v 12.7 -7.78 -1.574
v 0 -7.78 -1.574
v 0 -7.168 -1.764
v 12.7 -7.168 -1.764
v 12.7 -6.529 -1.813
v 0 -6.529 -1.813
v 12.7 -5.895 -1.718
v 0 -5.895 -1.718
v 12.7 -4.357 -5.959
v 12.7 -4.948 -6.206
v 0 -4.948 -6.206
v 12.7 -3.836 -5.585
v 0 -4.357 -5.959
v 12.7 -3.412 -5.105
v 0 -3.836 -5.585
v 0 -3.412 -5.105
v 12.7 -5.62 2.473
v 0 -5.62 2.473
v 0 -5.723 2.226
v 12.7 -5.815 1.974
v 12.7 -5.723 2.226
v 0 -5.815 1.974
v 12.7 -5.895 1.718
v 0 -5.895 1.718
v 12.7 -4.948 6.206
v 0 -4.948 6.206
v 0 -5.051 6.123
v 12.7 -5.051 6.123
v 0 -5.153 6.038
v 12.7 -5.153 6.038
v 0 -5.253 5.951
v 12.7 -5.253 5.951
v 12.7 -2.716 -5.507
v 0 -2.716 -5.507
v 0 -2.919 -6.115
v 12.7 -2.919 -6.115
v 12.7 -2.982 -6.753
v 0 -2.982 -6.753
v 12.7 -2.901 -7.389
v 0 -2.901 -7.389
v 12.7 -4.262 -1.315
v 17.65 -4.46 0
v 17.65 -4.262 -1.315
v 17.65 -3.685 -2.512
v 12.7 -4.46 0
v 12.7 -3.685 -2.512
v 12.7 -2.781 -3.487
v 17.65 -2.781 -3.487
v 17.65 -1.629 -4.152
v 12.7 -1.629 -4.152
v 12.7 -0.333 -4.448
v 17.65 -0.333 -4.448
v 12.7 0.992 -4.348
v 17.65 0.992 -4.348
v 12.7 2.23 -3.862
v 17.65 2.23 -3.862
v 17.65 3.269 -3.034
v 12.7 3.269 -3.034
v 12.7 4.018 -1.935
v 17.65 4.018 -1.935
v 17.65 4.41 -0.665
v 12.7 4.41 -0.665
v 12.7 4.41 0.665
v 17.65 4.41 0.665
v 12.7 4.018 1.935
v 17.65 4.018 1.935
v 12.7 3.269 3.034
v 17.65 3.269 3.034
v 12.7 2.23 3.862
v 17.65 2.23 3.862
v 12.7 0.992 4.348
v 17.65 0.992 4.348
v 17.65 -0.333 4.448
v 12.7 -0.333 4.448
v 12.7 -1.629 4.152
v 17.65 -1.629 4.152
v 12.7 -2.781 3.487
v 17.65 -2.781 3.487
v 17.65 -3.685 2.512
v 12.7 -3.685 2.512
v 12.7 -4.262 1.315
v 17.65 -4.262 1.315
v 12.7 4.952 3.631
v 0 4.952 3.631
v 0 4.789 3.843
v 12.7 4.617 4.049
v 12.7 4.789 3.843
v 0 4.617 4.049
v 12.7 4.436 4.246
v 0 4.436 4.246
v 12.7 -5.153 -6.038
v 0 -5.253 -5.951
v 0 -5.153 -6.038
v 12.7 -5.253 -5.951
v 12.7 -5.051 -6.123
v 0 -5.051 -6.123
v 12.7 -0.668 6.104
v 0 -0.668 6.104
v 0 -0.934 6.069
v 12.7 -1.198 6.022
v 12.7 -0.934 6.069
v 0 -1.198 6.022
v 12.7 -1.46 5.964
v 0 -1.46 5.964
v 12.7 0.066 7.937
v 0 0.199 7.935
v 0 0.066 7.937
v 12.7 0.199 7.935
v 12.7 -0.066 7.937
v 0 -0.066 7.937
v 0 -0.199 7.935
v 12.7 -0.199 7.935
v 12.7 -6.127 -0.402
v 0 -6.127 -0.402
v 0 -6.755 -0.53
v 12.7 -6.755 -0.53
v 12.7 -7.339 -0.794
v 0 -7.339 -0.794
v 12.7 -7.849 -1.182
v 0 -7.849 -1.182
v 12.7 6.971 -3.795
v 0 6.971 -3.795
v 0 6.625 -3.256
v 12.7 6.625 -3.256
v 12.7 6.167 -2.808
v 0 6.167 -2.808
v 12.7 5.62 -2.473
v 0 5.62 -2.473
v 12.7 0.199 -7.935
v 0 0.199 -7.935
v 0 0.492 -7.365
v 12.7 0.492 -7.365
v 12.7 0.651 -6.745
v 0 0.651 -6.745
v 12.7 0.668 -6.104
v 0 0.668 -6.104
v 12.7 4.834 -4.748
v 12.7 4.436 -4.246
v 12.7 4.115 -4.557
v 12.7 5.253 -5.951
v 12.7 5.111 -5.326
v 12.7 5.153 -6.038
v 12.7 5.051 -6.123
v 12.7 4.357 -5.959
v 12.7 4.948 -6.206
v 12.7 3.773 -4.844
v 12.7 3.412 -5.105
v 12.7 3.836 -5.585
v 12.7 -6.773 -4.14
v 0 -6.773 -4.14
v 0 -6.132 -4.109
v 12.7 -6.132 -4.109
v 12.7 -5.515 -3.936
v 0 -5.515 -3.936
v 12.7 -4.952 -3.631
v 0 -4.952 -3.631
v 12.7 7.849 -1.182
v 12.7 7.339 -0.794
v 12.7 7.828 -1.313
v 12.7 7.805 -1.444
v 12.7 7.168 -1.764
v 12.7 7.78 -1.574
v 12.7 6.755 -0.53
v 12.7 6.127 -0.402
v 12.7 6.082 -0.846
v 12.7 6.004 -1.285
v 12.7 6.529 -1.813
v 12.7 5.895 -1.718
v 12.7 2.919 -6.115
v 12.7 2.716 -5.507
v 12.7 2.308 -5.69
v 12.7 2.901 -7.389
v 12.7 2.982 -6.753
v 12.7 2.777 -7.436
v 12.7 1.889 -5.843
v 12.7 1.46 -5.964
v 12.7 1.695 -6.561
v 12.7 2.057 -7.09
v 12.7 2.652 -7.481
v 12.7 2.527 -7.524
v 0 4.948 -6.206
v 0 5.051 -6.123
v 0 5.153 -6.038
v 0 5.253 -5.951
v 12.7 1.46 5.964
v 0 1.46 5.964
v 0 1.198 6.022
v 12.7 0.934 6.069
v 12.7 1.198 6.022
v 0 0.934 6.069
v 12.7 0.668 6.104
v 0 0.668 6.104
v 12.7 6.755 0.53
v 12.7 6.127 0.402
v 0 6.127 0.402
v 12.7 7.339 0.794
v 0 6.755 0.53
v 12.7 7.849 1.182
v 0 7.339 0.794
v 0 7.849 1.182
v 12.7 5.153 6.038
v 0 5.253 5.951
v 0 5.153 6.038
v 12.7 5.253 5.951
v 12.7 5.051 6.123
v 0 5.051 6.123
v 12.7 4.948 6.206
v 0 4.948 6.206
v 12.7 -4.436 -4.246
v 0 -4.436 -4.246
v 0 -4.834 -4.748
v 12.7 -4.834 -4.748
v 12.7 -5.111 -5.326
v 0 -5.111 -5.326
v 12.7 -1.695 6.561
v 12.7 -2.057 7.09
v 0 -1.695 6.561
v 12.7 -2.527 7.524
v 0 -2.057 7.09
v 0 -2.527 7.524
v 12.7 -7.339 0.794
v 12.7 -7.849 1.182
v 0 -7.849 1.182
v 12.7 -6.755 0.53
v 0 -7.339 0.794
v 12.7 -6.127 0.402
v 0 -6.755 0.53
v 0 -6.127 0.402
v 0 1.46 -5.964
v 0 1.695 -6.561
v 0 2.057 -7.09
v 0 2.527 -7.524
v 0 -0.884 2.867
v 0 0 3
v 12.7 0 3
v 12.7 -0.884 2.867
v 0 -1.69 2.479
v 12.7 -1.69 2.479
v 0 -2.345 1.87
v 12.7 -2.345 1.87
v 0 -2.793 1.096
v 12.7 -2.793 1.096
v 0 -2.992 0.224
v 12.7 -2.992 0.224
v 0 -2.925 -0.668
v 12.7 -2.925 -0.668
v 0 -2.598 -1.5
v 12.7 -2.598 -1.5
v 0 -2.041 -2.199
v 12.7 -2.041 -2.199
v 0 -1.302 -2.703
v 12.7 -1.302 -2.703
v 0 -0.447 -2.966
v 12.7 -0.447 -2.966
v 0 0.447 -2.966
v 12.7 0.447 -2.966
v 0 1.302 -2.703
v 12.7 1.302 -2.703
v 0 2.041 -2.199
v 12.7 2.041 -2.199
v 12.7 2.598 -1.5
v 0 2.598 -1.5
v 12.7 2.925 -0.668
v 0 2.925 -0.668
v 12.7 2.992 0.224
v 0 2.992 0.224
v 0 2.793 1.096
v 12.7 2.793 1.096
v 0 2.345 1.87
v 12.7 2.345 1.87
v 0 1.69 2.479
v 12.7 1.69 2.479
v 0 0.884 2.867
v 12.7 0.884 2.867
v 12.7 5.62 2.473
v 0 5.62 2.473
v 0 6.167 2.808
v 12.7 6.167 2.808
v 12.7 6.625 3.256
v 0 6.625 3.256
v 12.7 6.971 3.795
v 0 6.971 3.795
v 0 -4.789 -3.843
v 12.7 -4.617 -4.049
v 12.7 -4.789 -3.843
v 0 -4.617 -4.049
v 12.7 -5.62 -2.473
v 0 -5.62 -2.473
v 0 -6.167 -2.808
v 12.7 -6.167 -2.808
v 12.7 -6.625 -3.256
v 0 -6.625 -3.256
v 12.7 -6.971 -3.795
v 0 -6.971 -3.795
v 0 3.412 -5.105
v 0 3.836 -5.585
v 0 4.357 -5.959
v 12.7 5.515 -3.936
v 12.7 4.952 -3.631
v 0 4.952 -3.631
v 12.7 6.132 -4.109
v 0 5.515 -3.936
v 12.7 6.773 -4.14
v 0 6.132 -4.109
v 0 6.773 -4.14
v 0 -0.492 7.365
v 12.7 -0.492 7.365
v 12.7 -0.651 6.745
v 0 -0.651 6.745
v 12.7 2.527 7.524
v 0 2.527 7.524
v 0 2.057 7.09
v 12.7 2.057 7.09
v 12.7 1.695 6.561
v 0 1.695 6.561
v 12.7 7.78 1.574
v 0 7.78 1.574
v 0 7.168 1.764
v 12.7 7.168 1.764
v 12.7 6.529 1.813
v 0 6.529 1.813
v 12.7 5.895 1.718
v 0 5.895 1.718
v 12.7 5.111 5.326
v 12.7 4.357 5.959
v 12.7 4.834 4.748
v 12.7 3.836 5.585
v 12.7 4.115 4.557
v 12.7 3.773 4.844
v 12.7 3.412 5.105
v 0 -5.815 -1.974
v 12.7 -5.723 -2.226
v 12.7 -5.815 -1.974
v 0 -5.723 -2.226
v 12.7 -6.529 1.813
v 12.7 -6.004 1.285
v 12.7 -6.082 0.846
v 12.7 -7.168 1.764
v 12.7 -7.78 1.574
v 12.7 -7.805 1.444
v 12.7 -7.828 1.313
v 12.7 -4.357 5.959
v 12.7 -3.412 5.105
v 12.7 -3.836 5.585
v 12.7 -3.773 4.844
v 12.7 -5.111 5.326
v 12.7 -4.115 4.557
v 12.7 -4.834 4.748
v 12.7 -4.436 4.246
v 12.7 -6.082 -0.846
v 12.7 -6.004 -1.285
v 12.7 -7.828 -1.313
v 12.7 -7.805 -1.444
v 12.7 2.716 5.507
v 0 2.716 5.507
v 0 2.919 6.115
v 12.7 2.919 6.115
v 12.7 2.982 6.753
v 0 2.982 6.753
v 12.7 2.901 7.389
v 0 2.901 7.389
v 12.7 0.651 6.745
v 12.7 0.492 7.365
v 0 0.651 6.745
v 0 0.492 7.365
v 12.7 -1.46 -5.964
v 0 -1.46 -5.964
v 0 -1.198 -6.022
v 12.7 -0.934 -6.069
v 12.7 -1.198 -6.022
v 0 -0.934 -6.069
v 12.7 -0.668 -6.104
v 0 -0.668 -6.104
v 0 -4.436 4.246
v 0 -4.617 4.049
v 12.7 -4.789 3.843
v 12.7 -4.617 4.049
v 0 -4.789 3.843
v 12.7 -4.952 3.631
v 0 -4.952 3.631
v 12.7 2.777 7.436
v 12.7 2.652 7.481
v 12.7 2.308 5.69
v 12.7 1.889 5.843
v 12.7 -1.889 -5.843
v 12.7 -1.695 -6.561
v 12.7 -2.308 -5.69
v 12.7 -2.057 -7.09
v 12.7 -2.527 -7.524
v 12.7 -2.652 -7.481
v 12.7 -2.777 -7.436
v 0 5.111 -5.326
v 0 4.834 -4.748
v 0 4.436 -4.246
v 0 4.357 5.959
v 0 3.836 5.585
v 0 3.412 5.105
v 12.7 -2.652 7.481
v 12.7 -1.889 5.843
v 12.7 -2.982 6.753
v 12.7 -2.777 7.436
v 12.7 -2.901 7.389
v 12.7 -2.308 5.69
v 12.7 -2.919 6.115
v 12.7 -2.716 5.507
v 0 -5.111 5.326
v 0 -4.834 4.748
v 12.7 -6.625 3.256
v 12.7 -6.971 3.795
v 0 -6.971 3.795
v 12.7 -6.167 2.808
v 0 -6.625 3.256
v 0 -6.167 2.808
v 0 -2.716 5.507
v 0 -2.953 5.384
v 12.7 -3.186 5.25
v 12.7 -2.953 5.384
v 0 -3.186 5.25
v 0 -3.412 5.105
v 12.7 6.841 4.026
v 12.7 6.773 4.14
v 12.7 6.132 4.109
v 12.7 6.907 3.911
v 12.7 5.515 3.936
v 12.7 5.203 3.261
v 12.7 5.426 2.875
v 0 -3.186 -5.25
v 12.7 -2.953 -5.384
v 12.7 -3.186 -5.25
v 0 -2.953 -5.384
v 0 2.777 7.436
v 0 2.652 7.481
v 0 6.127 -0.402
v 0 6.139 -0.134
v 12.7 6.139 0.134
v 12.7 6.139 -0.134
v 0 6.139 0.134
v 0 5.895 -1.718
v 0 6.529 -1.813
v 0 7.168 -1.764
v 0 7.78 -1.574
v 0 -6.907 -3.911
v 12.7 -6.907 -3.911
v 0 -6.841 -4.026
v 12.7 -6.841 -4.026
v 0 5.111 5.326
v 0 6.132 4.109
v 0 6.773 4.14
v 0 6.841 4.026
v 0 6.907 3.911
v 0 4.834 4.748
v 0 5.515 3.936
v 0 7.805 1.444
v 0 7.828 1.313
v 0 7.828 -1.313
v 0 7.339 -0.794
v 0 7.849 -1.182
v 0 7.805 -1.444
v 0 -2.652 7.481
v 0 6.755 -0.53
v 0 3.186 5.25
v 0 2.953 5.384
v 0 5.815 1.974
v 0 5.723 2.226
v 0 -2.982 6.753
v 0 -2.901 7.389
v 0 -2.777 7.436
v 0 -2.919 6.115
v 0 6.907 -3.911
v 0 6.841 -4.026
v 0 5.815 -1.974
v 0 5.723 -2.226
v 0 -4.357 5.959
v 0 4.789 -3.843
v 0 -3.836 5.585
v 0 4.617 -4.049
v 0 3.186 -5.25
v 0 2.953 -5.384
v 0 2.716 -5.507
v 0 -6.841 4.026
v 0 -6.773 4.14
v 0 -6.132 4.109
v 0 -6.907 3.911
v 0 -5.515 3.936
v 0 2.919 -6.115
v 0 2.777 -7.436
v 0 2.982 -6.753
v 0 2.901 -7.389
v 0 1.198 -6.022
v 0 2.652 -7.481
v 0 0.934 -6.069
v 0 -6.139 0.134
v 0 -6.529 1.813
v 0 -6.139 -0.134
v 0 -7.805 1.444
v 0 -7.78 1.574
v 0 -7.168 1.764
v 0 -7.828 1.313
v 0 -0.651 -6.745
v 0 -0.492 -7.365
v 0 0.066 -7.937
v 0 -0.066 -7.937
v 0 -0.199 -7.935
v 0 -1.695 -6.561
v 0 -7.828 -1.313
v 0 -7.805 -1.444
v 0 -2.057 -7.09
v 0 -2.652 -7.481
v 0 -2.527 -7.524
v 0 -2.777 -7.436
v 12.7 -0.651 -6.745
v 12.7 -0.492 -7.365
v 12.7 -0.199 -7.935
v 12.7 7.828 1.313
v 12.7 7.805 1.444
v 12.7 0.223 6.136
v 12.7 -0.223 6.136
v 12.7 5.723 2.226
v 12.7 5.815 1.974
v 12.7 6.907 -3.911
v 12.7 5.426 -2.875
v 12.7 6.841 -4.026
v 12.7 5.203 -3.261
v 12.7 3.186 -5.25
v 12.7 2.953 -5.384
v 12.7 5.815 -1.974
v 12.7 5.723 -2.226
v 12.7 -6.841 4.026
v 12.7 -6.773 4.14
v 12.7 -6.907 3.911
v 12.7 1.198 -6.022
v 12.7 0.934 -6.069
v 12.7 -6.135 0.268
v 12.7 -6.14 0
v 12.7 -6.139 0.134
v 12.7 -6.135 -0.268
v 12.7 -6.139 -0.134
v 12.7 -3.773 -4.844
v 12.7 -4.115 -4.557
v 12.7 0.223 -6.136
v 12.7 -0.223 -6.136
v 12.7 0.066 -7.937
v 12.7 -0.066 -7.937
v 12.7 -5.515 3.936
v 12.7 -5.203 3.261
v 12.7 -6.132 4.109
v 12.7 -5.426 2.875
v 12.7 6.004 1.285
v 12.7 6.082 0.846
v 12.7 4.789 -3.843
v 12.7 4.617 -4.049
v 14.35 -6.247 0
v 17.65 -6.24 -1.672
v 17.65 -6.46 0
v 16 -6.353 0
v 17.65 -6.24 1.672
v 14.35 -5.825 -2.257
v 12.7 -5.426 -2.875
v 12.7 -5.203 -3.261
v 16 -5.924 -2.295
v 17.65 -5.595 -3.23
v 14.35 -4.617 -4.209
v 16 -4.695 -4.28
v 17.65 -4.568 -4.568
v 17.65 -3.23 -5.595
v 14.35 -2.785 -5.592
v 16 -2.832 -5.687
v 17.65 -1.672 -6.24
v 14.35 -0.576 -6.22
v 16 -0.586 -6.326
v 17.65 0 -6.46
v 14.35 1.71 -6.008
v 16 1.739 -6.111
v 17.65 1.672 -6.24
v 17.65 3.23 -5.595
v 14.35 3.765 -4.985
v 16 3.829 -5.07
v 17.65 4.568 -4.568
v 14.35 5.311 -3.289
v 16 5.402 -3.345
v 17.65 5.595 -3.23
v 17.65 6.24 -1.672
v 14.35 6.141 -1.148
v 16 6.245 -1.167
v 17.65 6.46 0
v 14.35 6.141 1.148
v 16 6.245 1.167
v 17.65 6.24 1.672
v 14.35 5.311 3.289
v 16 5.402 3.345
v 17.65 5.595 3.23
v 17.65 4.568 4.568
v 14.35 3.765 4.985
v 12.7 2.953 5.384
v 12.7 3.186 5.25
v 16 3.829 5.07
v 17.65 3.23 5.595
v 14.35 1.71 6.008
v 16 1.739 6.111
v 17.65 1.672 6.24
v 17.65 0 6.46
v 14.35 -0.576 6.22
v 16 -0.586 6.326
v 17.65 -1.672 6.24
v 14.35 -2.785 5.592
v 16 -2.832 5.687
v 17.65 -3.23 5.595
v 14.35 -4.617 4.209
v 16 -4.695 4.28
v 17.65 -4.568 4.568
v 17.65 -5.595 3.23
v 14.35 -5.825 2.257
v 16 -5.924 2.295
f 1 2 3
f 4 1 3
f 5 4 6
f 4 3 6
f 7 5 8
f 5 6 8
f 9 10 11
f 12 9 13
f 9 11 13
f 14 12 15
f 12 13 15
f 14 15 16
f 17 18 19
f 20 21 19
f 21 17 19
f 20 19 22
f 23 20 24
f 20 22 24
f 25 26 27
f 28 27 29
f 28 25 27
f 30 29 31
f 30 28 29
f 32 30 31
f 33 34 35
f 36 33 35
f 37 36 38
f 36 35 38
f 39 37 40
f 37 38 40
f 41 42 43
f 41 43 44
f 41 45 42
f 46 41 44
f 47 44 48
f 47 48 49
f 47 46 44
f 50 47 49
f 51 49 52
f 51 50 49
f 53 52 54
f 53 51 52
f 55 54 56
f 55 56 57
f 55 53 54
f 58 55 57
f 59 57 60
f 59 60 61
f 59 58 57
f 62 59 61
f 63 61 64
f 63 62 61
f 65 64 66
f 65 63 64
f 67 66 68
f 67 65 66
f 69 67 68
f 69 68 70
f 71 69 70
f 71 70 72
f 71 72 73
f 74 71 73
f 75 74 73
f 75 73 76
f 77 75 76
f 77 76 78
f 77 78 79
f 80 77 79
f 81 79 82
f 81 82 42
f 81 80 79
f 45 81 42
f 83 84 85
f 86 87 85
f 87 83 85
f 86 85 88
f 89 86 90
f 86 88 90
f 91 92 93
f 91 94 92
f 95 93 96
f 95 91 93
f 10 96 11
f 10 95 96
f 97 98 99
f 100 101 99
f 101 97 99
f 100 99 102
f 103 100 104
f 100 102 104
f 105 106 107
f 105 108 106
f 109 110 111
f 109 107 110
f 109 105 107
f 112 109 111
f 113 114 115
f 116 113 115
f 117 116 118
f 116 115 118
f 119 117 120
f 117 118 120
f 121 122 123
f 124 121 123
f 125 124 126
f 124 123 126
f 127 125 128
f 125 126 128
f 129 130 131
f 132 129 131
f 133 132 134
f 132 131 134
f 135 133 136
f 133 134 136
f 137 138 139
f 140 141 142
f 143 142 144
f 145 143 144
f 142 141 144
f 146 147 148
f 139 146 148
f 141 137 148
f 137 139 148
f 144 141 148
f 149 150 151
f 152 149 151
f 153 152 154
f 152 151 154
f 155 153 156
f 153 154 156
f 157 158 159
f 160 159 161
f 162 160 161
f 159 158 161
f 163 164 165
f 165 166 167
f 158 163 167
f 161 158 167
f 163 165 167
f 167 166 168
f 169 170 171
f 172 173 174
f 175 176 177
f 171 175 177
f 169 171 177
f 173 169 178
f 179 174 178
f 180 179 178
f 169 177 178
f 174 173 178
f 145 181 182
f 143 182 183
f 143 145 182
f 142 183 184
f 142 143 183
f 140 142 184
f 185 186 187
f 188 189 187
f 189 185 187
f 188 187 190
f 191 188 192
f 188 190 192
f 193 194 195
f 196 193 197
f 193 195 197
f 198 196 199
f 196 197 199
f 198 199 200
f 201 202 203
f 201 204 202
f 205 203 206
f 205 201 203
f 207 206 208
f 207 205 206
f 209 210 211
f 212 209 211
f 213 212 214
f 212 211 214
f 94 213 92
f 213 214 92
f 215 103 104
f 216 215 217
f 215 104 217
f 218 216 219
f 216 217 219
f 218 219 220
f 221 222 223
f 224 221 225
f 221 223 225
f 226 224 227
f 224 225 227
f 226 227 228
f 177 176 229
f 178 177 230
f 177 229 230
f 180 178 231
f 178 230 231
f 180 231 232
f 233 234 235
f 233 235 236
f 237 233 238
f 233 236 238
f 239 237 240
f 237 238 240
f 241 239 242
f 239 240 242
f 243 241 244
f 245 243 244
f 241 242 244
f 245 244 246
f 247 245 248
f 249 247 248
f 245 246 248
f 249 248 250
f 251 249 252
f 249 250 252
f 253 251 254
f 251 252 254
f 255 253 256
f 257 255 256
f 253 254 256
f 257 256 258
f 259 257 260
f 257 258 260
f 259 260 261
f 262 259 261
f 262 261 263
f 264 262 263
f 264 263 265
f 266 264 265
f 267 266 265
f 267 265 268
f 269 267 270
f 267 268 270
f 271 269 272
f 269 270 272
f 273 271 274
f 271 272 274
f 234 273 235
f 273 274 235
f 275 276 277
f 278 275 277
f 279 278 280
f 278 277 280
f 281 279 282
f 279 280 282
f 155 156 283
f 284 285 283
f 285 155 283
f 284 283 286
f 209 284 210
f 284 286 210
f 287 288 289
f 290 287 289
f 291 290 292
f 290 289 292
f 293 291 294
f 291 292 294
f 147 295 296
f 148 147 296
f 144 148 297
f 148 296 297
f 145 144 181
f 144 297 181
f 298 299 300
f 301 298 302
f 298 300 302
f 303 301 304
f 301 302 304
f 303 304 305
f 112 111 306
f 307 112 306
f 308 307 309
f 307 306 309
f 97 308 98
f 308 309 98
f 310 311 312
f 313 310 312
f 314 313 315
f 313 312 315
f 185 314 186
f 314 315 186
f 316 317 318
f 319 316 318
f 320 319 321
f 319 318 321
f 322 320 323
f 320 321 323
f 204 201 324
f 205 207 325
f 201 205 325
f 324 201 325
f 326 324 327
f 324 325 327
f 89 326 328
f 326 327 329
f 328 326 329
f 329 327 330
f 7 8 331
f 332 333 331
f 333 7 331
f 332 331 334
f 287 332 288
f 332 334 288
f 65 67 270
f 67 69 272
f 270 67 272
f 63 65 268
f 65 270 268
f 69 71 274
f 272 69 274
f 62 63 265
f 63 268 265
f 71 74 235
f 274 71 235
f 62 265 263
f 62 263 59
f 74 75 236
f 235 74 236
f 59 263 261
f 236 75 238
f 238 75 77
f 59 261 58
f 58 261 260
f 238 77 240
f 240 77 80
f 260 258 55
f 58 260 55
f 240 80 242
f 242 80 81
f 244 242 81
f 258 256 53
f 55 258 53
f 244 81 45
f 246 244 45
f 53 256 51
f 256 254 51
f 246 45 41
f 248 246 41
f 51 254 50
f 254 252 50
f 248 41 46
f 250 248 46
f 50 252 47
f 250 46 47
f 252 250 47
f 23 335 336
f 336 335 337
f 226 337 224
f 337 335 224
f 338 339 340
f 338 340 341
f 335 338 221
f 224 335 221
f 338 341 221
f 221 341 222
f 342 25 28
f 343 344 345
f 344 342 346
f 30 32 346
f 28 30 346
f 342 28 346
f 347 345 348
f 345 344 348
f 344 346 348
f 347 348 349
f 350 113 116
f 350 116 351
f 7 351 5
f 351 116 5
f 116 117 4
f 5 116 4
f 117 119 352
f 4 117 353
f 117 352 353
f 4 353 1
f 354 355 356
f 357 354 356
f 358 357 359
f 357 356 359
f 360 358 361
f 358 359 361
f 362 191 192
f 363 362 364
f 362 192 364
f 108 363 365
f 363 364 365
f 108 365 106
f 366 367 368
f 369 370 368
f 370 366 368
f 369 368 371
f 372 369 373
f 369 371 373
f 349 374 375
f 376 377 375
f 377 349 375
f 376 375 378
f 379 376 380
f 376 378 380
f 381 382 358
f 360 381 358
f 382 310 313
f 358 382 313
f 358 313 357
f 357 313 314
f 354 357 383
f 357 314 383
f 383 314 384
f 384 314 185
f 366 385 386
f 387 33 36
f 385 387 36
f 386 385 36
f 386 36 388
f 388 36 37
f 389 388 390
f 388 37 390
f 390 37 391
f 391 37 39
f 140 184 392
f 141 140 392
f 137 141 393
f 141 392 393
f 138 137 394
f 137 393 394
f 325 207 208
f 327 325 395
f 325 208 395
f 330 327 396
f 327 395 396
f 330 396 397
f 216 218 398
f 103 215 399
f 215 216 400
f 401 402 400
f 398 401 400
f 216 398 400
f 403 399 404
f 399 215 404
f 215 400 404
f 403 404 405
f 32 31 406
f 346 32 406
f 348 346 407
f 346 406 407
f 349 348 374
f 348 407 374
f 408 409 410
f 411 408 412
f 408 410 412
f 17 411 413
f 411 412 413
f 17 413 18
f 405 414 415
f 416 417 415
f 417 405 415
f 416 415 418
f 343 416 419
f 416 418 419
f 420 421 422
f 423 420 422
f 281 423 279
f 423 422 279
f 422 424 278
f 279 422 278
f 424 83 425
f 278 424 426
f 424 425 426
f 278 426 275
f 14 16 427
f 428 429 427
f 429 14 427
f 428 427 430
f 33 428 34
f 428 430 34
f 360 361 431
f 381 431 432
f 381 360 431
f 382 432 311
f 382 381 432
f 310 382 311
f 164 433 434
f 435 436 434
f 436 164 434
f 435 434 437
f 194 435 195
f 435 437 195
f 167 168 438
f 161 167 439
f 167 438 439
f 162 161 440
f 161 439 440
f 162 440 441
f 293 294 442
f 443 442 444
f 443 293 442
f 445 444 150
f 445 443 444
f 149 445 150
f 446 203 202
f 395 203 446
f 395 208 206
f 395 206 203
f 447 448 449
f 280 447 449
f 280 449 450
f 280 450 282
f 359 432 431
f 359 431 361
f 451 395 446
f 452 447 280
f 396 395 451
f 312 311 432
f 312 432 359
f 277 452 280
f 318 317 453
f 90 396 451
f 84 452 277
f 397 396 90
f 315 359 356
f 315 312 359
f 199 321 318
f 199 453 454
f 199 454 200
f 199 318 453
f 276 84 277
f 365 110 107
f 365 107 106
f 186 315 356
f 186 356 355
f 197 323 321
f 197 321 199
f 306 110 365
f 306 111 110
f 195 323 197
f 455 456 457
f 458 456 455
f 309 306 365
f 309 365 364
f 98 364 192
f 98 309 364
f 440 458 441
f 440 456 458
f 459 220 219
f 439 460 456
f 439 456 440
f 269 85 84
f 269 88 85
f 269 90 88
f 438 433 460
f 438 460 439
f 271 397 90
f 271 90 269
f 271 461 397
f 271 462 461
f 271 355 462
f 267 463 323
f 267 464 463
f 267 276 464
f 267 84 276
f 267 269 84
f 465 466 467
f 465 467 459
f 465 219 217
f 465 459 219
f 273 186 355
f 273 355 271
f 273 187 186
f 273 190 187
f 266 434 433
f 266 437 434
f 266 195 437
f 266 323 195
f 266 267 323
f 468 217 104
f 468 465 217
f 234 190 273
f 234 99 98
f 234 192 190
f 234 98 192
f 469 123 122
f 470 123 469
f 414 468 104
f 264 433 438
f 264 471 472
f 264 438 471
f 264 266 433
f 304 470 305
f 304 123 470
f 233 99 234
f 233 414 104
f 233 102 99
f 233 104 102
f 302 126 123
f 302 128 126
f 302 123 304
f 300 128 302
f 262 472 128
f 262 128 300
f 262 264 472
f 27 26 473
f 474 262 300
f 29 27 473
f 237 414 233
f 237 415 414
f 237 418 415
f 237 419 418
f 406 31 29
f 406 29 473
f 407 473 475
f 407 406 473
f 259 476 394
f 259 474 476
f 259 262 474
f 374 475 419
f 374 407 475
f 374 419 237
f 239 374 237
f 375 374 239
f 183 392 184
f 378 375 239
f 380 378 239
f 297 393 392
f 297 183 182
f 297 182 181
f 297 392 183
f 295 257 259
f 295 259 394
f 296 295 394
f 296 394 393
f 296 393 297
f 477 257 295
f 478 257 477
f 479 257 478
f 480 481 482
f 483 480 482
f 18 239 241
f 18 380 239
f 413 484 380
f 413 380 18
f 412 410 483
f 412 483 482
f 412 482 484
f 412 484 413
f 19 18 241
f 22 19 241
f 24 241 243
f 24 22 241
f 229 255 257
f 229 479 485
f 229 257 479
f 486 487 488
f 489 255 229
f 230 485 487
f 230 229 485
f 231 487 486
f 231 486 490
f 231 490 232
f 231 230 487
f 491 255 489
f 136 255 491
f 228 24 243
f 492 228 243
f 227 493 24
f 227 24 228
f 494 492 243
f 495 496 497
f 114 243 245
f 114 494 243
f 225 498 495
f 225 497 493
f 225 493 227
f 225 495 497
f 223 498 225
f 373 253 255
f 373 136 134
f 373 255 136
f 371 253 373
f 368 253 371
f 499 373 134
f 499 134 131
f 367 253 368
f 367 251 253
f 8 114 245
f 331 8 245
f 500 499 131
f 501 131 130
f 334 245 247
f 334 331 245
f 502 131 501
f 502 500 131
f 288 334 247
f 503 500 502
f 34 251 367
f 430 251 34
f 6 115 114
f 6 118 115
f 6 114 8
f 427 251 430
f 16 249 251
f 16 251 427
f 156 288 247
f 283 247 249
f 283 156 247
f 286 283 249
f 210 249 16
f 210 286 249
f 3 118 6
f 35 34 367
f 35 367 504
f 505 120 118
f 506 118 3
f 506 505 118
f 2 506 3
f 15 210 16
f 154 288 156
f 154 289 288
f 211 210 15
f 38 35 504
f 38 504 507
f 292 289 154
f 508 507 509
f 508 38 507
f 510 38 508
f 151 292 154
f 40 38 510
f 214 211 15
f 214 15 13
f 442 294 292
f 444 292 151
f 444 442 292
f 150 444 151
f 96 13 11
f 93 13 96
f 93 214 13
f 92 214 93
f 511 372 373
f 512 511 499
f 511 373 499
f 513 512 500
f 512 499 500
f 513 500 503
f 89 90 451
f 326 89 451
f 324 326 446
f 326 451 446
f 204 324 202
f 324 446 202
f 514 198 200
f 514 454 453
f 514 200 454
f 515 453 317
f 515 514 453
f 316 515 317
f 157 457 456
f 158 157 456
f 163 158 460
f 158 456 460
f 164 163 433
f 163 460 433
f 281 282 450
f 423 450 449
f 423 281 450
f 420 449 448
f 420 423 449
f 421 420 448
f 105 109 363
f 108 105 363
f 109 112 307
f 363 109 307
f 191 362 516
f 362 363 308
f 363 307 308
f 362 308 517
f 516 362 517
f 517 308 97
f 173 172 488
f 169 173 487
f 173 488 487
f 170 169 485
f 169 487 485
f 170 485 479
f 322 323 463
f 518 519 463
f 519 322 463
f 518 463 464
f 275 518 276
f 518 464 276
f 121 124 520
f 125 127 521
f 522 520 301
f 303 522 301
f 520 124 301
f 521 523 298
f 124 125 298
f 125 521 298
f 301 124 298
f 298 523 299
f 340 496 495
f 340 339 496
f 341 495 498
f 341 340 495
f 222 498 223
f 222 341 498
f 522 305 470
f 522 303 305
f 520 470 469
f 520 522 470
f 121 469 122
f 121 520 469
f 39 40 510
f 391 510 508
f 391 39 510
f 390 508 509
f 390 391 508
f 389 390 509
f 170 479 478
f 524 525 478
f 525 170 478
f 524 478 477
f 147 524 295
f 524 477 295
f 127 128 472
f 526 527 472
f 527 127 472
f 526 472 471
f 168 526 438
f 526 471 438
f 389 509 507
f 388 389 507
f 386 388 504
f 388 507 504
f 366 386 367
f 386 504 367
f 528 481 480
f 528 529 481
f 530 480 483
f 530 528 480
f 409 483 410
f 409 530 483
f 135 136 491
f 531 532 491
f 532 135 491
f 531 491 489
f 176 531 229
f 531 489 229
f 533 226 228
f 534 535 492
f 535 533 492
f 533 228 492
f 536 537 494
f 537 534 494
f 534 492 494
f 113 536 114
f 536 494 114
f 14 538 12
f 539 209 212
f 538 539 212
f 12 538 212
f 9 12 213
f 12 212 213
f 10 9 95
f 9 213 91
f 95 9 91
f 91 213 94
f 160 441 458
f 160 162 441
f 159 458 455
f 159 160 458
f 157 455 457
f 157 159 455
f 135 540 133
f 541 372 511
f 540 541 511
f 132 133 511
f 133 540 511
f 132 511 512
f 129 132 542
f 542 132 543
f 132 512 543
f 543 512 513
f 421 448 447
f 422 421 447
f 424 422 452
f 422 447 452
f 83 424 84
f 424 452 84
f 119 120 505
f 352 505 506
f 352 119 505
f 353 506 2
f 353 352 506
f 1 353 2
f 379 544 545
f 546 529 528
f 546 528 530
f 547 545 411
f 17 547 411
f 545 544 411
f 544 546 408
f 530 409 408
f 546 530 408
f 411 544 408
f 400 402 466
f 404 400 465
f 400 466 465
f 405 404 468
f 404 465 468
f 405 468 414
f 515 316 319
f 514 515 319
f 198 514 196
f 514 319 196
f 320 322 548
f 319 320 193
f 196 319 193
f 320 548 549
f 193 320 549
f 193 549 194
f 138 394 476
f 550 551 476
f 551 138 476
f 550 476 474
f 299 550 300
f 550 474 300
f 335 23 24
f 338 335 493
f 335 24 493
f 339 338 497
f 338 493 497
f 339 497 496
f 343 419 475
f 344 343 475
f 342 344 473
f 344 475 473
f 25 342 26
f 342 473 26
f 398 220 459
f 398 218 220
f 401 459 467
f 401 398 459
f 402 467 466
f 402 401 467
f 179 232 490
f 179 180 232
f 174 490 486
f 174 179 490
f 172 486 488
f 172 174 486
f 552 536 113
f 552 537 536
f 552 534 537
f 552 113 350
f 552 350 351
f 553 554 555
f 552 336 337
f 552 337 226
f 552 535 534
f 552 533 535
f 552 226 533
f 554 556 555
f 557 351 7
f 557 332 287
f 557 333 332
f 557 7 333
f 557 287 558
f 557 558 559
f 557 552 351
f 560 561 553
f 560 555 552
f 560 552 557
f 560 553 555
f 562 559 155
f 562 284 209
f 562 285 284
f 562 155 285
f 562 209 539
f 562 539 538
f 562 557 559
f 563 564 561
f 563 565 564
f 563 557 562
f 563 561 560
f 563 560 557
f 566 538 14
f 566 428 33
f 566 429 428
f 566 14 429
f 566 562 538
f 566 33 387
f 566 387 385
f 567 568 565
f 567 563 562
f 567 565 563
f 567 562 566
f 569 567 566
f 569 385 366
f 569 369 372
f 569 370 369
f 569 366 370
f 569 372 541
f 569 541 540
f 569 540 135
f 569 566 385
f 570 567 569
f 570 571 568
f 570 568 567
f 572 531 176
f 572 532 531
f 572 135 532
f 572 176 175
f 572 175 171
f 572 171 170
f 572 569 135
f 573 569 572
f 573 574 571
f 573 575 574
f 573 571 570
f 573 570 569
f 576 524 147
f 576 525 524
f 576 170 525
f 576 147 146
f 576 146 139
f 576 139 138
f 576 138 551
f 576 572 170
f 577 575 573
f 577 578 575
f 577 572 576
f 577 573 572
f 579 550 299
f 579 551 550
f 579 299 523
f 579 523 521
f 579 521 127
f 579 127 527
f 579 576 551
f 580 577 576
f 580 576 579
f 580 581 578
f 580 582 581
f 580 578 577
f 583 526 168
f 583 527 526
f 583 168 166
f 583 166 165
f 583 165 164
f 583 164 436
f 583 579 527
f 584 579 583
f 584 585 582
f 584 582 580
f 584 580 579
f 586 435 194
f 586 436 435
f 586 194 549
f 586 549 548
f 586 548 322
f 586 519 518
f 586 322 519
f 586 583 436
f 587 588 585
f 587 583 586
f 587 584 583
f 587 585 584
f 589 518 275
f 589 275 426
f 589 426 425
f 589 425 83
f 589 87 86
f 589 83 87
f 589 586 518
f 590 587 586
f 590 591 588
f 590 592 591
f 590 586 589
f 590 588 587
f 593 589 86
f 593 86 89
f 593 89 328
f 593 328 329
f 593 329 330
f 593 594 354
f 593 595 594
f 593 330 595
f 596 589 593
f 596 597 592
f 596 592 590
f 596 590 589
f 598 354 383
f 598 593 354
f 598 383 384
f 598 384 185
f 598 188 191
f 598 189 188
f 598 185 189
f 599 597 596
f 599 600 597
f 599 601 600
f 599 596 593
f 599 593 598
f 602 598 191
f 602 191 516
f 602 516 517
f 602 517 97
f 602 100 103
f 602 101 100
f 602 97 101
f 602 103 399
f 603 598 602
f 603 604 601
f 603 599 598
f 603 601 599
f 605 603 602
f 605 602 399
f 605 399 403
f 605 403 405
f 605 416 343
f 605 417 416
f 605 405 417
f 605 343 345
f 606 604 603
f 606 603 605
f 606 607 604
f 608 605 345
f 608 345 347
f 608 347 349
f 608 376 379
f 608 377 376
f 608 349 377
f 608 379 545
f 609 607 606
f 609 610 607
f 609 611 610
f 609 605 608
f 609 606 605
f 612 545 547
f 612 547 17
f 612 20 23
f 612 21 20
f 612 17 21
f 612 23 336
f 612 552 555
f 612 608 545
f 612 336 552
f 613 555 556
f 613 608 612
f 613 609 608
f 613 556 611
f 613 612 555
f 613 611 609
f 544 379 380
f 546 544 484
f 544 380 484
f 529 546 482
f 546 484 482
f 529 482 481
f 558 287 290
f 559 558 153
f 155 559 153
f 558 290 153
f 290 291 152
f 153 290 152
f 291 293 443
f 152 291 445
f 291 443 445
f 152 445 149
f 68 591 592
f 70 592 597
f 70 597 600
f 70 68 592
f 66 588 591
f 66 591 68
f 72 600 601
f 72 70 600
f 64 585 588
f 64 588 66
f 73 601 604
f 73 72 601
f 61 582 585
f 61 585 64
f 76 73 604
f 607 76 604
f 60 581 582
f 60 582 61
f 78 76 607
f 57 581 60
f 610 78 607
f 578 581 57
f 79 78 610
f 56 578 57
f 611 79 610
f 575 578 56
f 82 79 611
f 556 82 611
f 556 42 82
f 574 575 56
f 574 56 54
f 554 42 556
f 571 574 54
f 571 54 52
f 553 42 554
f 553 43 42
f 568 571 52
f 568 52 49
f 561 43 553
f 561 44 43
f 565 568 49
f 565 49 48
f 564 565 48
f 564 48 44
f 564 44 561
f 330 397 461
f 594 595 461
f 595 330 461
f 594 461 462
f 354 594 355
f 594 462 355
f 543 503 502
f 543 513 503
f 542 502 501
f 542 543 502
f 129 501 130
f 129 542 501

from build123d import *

# Parameters (mm, degrees)
BASPROSKE_W     = 12.7
BASPROSKE_H     = 7.9375
TOOTHCUT_DEPTH  = 17.949861725
TEETHCUTS_COUNT = 18
TEETHCUTS_ANGLE = 340
BORSKE_R        = 3
BORE_DEPTH      = 50.8000508


with BuildPart() as part:
    # BasProSke → Base-Revolve (revolve)
    with BuildSketch(Plane(origin=(0, 0, 0), x_dir=(1, 0, 0), z_dir=(0, 1, 0)), mode=Mode.PRIVATE) as base_revolve_sk:
        with Locations((6.35, 3.96875)):
            Rectangle(BASPROSKE_W, BASPROSKE_H)
    revolve(base_revolve_sk.sketch.rotate(Axis((-10, 0, 0), (1, 0, 0)), 180), axis=Axis((-10, 0, 0), (1, 0, 0)))

    # TooCutSke → ToothCut (cut, through all)
    with BuildSketch(Plane(origin=(0, 0, 0), x_dir=(0, 0, -1), z_dir=(1, 0, 0))):
        with BuildLine():
            ThreePointArc((0.401805019, 6.127289689), (0, 6.14045), (-0.401805019, 6.127289689))
            ThreePointArc((-0.401805019, 6.127289689), (-0.651999955, 7.068698885), (-1.203877601, 7.87136933))
            ThreePointArc((-1.203877601, 7.87136933), (0, 7.9629), (1.203877601, 7.87136933))
            ThreePointArc((1.203877601, 7.87136933), (0.651999955, 7.068698885), (0.401805019, 6.127289689))
        make_face()
    toothcut = extrude(amount=TOOTHCUT_DEPTH, mode=Mode.SUBTRACT)

    # TeethCuts: ToothCut ×18 about axis
    teethcuts_axis = Axis((-10, 0, 0), (1, 0, 0))
    for i in range(1, TEETHCUTS_COUNT):
        add(toothcut.rotate(teethcuts_axis, i * TEETHCUTS_ANGLE / (TEETHCUTS_COUNT - 1)), mode=Mode.SUBTRACT)

    # BorSke → Bore (cut, symmetric)
    with BuildSketch(Plane(origin=(0, 0, 0), x_dir=(0, 0, -1), z_dir=(1, 0, 0))):
        with Locations(Location((0, 0, 0), (0, 0, 180))):
            Circle(BORSKE_R)
    extrude(amount=BORE_DEPTH, both=True, mode=Mode.SUBTRACT)

    # Sketch1 → Revolve1 (revolve)
    with BuildSketch(Plane.XY, mode=Mode.PRIVATE) as revolve1_sk:
        Polygon((12.7, 6.14045), (17.65, 6.46), (17.65, 4.46), (12.7, 4.46), align=None)
    revolve(revolve1_sk.sketch.rotate(Axis((12.7, 0, 0), (1, 0, 0)), 180), axis=Axis((12.7, 0, 0), (1, 0, 0)))


solid = part.part
